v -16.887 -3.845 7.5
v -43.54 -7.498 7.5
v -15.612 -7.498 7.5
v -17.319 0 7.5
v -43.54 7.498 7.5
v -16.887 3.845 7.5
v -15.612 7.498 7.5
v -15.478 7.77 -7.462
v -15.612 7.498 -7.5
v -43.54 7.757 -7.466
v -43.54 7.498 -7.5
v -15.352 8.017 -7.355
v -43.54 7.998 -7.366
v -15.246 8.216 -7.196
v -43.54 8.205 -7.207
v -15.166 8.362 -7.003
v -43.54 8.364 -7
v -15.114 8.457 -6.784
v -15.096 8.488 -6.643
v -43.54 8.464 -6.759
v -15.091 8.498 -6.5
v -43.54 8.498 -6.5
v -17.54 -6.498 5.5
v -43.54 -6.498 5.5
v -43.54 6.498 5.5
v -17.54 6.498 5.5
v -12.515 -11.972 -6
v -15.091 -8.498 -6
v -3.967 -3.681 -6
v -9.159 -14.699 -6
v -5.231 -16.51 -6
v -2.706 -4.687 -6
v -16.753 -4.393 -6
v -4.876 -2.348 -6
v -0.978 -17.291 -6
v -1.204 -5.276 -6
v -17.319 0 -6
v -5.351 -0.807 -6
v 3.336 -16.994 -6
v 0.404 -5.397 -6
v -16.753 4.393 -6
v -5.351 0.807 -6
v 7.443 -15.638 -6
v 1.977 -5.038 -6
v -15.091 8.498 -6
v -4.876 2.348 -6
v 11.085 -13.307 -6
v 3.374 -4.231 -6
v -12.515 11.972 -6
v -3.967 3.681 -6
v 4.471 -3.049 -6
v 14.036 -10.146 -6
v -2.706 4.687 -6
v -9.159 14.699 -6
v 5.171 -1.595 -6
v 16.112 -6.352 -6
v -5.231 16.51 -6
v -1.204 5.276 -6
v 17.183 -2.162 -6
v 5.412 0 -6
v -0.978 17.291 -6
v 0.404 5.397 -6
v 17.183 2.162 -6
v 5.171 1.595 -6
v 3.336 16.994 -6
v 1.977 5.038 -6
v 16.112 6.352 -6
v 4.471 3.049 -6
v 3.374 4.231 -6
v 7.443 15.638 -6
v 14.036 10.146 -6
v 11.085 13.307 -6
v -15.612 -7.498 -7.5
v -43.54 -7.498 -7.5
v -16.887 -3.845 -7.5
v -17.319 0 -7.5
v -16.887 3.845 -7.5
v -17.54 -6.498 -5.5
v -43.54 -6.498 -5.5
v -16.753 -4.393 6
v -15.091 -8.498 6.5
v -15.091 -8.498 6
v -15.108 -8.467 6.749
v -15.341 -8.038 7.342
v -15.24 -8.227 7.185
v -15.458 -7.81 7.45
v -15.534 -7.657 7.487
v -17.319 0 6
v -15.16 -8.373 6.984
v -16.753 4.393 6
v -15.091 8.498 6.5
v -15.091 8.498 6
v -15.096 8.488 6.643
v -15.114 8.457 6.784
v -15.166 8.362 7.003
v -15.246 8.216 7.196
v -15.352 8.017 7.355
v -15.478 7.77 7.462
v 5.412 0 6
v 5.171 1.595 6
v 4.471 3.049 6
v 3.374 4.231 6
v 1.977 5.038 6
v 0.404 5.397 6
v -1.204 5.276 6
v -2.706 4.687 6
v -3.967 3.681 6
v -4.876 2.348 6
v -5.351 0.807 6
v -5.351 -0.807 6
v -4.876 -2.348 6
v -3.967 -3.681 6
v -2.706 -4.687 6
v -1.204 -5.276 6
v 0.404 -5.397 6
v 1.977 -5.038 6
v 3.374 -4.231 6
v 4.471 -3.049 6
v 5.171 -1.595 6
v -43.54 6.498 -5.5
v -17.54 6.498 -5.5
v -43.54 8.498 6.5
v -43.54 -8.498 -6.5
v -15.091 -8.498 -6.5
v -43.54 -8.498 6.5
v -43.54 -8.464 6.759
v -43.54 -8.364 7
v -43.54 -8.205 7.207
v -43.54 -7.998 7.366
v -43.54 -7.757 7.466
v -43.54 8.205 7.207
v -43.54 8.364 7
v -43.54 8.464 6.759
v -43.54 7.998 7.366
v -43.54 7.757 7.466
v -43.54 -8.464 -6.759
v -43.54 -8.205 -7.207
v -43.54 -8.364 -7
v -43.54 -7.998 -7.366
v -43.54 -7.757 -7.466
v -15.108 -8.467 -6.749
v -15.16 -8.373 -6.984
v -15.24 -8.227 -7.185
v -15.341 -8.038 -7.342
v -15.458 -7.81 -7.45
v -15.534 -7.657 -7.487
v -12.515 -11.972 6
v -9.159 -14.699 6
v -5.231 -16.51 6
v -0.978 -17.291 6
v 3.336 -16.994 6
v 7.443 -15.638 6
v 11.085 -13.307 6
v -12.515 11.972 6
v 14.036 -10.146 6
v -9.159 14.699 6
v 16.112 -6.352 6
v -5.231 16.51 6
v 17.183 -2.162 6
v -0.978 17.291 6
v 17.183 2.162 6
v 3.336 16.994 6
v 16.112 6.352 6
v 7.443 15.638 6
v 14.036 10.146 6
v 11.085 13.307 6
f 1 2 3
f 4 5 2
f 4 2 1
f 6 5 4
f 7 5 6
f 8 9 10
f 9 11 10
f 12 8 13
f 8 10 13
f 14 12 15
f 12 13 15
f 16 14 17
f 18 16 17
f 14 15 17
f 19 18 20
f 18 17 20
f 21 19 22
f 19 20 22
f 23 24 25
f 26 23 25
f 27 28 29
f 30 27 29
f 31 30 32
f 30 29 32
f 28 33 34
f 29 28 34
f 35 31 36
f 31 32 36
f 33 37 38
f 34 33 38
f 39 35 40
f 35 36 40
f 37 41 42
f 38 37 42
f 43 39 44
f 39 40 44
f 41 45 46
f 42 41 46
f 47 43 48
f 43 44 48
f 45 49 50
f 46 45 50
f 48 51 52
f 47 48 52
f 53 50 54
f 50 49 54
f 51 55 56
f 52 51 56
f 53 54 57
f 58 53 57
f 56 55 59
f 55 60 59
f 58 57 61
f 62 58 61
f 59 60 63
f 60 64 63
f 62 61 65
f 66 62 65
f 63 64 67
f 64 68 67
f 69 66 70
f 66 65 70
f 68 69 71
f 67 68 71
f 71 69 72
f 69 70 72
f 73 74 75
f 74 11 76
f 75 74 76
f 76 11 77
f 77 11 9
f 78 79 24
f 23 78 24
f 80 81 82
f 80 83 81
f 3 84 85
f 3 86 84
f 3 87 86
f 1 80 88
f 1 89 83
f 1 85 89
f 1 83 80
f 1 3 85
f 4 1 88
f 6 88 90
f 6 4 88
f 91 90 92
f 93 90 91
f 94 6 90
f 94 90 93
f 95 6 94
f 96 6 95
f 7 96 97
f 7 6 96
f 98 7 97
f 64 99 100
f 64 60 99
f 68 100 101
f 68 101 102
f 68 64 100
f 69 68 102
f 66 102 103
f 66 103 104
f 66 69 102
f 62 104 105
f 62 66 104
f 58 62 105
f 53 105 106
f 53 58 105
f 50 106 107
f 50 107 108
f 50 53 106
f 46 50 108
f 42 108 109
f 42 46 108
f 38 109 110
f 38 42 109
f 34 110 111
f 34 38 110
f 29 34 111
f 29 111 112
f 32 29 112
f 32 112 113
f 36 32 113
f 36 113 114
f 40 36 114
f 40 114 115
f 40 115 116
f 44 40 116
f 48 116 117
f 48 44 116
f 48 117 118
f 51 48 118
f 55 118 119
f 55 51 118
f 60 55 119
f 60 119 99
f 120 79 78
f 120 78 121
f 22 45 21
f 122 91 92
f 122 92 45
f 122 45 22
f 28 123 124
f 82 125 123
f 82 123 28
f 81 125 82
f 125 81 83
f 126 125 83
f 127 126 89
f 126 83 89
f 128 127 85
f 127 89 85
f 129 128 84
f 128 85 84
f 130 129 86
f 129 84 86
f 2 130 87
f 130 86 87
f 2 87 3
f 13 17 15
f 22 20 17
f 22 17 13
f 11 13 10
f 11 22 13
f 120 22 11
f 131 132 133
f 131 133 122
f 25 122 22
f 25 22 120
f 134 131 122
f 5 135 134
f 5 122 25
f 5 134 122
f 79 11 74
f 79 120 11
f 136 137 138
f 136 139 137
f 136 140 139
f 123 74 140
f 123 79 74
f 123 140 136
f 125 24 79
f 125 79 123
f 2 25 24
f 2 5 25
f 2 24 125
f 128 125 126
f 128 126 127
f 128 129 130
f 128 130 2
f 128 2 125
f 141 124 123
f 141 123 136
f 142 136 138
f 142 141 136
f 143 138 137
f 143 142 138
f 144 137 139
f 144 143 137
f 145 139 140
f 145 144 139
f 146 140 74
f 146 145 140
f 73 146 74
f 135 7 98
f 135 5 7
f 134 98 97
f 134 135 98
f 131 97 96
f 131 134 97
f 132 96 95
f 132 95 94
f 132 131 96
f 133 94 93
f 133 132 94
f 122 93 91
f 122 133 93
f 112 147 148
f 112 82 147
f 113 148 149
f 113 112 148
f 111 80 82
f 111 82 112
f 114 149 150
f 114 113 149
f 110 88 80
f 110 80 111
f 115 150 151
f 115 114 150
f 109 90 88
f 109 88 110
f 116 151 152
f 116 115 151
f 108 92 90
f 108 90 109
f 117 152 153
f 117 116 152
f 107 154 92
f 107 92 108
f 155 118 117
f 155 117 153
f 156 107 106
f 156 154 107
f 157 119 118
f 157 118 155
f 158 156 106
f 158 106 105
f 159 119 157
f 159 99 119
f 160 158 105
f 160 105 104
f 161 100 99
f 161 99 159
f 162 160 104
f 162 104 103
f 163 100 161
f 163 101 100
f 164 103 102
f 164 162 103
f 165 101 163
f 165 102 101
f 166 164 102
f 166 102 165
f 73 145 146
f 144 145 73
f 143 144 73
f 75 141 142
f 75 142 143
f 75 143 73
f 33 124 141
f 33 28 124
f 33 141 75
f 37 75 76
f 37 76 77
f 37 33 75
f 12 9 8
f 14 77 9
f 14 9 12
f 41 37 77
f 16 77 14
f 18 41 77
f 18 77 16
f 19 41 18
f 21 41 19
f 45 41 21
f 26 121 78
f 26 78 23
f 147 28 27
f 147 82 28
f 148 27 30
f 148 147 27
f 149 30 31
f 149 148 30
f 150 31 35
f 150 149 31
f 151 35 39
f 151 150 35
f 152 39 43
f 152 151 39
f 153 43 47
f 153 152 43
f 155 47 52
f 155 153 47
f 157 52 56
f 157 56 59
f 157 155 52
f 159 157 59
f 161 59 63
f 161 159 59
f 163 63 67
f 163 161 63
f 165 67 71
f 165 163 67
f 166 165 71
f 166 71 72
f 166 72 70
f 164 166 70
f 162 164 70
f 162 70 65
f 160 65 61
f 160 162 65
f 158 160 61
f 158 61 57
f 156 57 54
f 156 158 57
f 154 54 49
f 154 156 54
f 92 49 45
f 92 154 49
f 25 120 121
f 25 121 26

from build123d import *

# Parameters (mm, degrees)
SKETCH1_R           = 17.318879346
SKETCH1_R_2         = 5.411731441
BOSS_EXTRUDE1_DEPTH = 6
BOSS_EXTRUDE2_DEPTH = 7.5
SKETCH2_W           = 11
SKETCH2_H           = 12.996419178
CUT_EXTRUDE1_DEPTH  = 26
FILLET1_R           = 1


with BuildPart() as part:
    # Sketch1 → Boss-Extrude1 (new body, symmetric)
    with BuildSketch(Plane.XY):
        Circle(SKETCH1_R)
        Circle(SKETCH1_R_2, mode=Mode.SUBTRACT)
    extrude(amount=BOSS_EXTRUDE1_DEPTH, both=True)

    # Sketch1_3 → Boss-Extrude2 (add, symmetric)
    with BuildSketch(Plane.XY):
        with BuildLine():
            Line((-43.539982068, -8.498209589), (-15.090527346, -8.498209589))
            ThreePointArc((-15.090527346, -8.498209589), (-17.318879346, 0), (-15.090527346, 8.498209589))
            Line((-15.090527346, 8.498209589), (-43.539982068, 8.498209589))
            Line((-43.539982068, 8.498209589), (-43.539982068, -8.498209589))
        make_face()
    extrude(amount=BOSS_EXTRUDE2_DEPTH, both=True)

    # Sketch2 → Cut-Extrude1 (cut)
    with BuildSketch(Plane.ZY.offset(43.539982068)):
        Rectangle(SKETCH2_W, SKETCH2_H)
    extrude(amount=-CUT_EXTRUDE1_DEPTH, mode=Mode.SUBTRACT)

    # Fillet1
    fillet1_edges = [part.edges().sort_by_distance(p)[0] for p in [
        (-29.315254707, 8.498209589, -7.5),
        (-29.315254707, -8.498209589, 7.5),
        (-29.315254707, 8.498209589, 7.5),
        (-29.315254707, -8.498209589, -7.5),
    ]]
    fillet(fillet1_edges, radius=FILLET1_R)


solid = part.part
